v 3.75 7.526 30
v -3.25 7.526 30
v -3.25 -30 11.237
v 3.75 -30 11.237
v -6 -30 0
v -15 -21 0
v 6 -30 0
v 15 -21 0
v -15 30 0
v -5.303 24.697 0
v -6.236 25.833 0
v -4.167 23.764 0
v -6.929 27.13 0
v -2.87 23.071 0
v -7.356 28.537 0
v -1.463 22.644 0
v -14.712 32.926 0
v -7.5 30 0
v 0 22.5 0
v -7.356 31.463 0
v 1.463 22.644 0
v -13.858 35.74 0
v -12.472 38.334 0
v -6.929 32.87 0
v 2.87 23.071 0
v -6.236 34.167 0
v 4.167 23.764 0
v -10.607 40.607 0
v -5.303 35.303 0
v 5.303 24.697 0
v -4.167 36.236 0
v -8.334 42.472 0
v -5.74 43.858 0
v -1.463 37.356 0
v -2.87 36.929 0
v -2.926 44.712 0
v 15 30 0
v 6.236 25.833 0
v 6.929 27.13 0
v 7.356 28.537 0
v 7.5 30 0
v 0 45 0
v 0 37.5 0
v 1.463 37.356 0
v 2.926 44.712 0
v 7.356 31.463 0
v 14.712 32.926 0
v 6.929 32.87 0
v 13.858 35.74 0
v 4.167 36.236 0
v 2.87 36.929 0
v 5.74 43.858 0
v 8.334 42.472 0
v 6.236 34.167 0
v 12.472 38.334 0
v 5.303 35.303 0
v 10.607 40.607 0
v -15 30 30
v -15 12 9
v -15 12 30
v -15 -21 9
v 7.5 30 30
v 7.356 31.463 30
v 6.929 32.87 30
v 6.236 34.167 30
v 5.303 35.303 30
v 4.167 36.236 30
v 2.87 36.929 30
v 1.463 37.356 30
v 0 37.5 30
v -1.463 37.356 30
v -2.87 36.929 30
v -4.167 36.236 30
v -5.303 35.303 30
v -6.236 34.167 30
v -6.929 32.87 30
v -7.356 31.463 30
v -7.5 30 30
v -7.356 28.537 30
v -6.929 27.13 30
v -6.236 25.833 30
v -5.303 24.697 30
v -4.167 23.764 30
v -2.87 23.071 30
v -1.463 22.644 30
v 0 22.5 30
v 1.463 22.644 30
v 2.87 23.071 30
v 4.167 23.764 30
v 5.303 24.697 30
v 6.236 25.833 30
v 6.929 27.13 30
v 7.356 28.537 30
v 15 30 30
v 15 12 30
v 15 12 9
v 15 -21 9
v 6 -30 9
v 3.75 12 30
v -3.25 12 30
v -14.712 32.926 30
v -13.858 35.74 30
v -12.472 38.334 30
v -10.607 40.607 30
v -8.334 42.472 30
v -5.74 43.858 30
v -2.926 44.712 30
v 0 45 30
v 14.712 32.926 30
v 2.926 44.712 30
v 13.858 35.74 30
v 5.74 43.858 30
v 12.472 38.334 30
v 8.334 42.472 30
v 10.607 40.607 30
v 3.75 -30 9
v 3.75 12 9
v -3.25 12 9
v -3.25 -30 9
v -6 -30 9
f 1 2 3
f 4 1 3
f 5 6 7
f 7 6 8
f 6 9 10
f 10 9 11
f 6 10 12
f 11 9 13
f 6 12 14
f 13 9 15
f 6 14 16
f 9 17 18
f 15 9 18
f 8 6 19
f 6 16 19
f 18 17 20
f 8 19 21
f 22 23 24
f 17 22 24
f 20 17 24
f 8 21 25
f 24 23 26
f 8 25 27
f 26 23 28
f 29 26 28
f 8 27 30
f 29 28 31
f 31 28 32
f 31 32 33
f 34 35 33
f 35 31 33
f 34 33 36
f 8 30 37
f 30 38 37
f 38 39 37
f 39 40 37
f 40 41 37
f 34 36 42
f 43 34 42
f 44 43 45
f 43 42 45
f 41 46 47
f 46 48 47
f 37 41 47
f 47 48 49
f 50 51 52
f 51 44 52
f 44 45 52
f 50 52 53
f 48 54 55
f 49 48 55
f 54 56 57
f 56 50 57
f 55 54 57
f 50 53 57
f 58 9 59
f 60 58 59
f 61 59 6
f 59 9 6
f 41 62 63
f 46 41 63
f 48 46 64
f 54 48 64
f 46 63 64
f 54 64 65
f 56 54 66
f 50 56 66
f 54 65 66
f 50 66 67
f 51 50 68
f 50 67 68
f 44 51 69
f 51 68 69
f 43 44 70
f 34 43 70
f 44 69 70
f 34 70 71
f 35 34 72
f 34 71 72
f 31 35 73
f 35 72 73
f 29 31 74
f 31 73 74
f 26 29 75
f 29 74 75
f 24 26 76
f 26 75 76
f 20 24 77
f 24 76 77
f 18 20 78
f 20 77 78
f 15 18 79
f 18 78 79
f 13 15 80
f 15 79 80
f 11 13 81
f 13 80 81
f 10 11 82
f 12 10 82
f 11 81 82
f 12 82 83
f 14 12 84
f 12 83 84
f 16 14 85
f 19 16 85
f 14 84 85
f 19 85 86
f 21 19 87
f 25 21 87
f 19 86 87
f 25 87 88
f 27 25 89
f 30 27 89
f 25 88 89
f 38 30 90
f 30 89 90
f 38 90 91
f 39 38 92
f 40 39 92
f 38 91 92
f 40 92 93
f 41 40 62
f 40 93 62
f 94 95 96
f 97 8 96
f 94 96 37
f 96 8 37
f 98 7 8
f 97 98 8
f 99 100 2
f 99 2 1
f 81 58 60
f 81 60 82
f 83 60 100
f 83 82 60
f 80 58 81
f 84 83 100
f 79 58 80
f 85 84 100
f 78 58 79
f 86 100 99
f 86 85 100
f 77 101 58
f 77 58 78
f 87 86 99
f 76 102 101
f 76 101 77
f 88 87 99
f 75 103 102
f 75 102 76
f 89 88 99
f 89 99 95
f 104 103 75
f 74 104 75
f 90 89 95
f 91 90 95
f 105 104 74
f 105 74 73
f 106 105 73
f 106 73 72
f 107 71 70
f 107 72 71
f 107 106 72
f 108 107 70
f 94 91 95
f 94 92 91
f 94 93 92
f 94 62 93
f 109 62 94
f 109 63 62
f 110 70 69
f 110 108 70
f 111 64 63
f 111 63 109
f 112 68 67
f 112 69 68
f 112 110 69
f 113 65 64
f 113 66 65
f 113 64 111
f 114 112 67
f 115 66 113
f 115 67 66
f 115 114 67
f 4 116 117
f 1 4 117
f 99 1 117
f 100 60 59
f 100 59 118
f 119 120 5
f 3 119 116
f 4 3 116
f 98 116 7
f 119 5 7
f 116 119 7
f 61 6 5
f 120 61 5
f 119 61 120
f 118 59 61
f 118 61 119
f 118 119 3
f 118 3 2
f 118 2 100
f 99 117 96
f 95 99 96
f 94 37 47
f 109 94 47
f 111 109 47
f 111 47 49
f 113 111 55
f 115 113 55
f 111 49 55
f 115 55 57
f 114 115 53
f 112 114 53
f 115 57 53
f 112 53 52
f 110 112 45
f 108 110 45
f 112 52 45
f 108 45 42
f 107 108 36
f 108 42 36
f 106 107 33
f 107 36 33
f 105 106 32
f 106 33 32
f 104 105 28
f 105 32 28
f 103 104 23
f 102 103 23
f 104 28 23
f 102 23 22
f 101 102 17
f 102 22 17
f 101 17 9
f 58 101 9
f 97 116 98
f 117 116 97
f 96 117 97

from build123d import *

# Parameters (mm, degrees)
F1_DEPTH  = 9
F2_W      = 7
F2_H      = 42
F3_DEPTH  = 21
F5_DEPTH  = 25
F7_DEPTH  = 30
F8_DEPTH  = 21
F9_R      = 7.5
F10_DEPTH = 30


with BuildPart() as f1:
    # F0 (on Top) → F1 (new body)
    with BuildSketch(Plane.XY):
        Polygon((15, 30), (-15, 30), (-15, -21), (-6, -30), (6, -30), (15, -21), align=None)
    extrude(amount=F1_DEPTH)

    # F2 (on face) → F3 (join)
    with BuildSketch(Plane.XY.offset(9)):
        with Locations((0.25, -9)):
            Rectangle(F2_W, F2_H)
    extrude(amount=F3_DEPTH)

    # F4 (on face) → F5 (cut)
    with BuildSketch(Plane(origin=(-3.25, 0, 0), x_dir=(0, -1, 0), z_dir=(-1, 0, 0))):
        Polygon((30, 30), (-7.5259371102, 30), (30, 11.2370314449), align=None)
    extrude(amount=-F5_DEPTH, mode=Mode.SUBTRACT)

    # F0 (on Top) → F7 (join)
    with BuildSketch(Plane.XY):
        with BuildLine():
            ThreePointArc((15, 30), (0, 45), (-15, 30))
            Line((-15, 30), (15, 30))
        make_face()
    extrude(amount=F7_DEPTH)

    # F6 (on face) → F8 (join)
    with BuildSketch(Plane.XY.offset(9)):
        Polygon((3.75, 12), (15, 12), (15, 30), (-15, 30), (-15, 12), (-3.25, 12), align=None)
    extrude(amount=F8_DEPTH)

    # F9 (on face) → F10 (cut)
    with BuildSketch(Plane.XY.offset(30)):
        with Locations((0, 30)):
            Circle(F9_R)
    extrude(amount=-F10_DEPTH, mode=Mode.SUBTRACT)


solid = f1.part
